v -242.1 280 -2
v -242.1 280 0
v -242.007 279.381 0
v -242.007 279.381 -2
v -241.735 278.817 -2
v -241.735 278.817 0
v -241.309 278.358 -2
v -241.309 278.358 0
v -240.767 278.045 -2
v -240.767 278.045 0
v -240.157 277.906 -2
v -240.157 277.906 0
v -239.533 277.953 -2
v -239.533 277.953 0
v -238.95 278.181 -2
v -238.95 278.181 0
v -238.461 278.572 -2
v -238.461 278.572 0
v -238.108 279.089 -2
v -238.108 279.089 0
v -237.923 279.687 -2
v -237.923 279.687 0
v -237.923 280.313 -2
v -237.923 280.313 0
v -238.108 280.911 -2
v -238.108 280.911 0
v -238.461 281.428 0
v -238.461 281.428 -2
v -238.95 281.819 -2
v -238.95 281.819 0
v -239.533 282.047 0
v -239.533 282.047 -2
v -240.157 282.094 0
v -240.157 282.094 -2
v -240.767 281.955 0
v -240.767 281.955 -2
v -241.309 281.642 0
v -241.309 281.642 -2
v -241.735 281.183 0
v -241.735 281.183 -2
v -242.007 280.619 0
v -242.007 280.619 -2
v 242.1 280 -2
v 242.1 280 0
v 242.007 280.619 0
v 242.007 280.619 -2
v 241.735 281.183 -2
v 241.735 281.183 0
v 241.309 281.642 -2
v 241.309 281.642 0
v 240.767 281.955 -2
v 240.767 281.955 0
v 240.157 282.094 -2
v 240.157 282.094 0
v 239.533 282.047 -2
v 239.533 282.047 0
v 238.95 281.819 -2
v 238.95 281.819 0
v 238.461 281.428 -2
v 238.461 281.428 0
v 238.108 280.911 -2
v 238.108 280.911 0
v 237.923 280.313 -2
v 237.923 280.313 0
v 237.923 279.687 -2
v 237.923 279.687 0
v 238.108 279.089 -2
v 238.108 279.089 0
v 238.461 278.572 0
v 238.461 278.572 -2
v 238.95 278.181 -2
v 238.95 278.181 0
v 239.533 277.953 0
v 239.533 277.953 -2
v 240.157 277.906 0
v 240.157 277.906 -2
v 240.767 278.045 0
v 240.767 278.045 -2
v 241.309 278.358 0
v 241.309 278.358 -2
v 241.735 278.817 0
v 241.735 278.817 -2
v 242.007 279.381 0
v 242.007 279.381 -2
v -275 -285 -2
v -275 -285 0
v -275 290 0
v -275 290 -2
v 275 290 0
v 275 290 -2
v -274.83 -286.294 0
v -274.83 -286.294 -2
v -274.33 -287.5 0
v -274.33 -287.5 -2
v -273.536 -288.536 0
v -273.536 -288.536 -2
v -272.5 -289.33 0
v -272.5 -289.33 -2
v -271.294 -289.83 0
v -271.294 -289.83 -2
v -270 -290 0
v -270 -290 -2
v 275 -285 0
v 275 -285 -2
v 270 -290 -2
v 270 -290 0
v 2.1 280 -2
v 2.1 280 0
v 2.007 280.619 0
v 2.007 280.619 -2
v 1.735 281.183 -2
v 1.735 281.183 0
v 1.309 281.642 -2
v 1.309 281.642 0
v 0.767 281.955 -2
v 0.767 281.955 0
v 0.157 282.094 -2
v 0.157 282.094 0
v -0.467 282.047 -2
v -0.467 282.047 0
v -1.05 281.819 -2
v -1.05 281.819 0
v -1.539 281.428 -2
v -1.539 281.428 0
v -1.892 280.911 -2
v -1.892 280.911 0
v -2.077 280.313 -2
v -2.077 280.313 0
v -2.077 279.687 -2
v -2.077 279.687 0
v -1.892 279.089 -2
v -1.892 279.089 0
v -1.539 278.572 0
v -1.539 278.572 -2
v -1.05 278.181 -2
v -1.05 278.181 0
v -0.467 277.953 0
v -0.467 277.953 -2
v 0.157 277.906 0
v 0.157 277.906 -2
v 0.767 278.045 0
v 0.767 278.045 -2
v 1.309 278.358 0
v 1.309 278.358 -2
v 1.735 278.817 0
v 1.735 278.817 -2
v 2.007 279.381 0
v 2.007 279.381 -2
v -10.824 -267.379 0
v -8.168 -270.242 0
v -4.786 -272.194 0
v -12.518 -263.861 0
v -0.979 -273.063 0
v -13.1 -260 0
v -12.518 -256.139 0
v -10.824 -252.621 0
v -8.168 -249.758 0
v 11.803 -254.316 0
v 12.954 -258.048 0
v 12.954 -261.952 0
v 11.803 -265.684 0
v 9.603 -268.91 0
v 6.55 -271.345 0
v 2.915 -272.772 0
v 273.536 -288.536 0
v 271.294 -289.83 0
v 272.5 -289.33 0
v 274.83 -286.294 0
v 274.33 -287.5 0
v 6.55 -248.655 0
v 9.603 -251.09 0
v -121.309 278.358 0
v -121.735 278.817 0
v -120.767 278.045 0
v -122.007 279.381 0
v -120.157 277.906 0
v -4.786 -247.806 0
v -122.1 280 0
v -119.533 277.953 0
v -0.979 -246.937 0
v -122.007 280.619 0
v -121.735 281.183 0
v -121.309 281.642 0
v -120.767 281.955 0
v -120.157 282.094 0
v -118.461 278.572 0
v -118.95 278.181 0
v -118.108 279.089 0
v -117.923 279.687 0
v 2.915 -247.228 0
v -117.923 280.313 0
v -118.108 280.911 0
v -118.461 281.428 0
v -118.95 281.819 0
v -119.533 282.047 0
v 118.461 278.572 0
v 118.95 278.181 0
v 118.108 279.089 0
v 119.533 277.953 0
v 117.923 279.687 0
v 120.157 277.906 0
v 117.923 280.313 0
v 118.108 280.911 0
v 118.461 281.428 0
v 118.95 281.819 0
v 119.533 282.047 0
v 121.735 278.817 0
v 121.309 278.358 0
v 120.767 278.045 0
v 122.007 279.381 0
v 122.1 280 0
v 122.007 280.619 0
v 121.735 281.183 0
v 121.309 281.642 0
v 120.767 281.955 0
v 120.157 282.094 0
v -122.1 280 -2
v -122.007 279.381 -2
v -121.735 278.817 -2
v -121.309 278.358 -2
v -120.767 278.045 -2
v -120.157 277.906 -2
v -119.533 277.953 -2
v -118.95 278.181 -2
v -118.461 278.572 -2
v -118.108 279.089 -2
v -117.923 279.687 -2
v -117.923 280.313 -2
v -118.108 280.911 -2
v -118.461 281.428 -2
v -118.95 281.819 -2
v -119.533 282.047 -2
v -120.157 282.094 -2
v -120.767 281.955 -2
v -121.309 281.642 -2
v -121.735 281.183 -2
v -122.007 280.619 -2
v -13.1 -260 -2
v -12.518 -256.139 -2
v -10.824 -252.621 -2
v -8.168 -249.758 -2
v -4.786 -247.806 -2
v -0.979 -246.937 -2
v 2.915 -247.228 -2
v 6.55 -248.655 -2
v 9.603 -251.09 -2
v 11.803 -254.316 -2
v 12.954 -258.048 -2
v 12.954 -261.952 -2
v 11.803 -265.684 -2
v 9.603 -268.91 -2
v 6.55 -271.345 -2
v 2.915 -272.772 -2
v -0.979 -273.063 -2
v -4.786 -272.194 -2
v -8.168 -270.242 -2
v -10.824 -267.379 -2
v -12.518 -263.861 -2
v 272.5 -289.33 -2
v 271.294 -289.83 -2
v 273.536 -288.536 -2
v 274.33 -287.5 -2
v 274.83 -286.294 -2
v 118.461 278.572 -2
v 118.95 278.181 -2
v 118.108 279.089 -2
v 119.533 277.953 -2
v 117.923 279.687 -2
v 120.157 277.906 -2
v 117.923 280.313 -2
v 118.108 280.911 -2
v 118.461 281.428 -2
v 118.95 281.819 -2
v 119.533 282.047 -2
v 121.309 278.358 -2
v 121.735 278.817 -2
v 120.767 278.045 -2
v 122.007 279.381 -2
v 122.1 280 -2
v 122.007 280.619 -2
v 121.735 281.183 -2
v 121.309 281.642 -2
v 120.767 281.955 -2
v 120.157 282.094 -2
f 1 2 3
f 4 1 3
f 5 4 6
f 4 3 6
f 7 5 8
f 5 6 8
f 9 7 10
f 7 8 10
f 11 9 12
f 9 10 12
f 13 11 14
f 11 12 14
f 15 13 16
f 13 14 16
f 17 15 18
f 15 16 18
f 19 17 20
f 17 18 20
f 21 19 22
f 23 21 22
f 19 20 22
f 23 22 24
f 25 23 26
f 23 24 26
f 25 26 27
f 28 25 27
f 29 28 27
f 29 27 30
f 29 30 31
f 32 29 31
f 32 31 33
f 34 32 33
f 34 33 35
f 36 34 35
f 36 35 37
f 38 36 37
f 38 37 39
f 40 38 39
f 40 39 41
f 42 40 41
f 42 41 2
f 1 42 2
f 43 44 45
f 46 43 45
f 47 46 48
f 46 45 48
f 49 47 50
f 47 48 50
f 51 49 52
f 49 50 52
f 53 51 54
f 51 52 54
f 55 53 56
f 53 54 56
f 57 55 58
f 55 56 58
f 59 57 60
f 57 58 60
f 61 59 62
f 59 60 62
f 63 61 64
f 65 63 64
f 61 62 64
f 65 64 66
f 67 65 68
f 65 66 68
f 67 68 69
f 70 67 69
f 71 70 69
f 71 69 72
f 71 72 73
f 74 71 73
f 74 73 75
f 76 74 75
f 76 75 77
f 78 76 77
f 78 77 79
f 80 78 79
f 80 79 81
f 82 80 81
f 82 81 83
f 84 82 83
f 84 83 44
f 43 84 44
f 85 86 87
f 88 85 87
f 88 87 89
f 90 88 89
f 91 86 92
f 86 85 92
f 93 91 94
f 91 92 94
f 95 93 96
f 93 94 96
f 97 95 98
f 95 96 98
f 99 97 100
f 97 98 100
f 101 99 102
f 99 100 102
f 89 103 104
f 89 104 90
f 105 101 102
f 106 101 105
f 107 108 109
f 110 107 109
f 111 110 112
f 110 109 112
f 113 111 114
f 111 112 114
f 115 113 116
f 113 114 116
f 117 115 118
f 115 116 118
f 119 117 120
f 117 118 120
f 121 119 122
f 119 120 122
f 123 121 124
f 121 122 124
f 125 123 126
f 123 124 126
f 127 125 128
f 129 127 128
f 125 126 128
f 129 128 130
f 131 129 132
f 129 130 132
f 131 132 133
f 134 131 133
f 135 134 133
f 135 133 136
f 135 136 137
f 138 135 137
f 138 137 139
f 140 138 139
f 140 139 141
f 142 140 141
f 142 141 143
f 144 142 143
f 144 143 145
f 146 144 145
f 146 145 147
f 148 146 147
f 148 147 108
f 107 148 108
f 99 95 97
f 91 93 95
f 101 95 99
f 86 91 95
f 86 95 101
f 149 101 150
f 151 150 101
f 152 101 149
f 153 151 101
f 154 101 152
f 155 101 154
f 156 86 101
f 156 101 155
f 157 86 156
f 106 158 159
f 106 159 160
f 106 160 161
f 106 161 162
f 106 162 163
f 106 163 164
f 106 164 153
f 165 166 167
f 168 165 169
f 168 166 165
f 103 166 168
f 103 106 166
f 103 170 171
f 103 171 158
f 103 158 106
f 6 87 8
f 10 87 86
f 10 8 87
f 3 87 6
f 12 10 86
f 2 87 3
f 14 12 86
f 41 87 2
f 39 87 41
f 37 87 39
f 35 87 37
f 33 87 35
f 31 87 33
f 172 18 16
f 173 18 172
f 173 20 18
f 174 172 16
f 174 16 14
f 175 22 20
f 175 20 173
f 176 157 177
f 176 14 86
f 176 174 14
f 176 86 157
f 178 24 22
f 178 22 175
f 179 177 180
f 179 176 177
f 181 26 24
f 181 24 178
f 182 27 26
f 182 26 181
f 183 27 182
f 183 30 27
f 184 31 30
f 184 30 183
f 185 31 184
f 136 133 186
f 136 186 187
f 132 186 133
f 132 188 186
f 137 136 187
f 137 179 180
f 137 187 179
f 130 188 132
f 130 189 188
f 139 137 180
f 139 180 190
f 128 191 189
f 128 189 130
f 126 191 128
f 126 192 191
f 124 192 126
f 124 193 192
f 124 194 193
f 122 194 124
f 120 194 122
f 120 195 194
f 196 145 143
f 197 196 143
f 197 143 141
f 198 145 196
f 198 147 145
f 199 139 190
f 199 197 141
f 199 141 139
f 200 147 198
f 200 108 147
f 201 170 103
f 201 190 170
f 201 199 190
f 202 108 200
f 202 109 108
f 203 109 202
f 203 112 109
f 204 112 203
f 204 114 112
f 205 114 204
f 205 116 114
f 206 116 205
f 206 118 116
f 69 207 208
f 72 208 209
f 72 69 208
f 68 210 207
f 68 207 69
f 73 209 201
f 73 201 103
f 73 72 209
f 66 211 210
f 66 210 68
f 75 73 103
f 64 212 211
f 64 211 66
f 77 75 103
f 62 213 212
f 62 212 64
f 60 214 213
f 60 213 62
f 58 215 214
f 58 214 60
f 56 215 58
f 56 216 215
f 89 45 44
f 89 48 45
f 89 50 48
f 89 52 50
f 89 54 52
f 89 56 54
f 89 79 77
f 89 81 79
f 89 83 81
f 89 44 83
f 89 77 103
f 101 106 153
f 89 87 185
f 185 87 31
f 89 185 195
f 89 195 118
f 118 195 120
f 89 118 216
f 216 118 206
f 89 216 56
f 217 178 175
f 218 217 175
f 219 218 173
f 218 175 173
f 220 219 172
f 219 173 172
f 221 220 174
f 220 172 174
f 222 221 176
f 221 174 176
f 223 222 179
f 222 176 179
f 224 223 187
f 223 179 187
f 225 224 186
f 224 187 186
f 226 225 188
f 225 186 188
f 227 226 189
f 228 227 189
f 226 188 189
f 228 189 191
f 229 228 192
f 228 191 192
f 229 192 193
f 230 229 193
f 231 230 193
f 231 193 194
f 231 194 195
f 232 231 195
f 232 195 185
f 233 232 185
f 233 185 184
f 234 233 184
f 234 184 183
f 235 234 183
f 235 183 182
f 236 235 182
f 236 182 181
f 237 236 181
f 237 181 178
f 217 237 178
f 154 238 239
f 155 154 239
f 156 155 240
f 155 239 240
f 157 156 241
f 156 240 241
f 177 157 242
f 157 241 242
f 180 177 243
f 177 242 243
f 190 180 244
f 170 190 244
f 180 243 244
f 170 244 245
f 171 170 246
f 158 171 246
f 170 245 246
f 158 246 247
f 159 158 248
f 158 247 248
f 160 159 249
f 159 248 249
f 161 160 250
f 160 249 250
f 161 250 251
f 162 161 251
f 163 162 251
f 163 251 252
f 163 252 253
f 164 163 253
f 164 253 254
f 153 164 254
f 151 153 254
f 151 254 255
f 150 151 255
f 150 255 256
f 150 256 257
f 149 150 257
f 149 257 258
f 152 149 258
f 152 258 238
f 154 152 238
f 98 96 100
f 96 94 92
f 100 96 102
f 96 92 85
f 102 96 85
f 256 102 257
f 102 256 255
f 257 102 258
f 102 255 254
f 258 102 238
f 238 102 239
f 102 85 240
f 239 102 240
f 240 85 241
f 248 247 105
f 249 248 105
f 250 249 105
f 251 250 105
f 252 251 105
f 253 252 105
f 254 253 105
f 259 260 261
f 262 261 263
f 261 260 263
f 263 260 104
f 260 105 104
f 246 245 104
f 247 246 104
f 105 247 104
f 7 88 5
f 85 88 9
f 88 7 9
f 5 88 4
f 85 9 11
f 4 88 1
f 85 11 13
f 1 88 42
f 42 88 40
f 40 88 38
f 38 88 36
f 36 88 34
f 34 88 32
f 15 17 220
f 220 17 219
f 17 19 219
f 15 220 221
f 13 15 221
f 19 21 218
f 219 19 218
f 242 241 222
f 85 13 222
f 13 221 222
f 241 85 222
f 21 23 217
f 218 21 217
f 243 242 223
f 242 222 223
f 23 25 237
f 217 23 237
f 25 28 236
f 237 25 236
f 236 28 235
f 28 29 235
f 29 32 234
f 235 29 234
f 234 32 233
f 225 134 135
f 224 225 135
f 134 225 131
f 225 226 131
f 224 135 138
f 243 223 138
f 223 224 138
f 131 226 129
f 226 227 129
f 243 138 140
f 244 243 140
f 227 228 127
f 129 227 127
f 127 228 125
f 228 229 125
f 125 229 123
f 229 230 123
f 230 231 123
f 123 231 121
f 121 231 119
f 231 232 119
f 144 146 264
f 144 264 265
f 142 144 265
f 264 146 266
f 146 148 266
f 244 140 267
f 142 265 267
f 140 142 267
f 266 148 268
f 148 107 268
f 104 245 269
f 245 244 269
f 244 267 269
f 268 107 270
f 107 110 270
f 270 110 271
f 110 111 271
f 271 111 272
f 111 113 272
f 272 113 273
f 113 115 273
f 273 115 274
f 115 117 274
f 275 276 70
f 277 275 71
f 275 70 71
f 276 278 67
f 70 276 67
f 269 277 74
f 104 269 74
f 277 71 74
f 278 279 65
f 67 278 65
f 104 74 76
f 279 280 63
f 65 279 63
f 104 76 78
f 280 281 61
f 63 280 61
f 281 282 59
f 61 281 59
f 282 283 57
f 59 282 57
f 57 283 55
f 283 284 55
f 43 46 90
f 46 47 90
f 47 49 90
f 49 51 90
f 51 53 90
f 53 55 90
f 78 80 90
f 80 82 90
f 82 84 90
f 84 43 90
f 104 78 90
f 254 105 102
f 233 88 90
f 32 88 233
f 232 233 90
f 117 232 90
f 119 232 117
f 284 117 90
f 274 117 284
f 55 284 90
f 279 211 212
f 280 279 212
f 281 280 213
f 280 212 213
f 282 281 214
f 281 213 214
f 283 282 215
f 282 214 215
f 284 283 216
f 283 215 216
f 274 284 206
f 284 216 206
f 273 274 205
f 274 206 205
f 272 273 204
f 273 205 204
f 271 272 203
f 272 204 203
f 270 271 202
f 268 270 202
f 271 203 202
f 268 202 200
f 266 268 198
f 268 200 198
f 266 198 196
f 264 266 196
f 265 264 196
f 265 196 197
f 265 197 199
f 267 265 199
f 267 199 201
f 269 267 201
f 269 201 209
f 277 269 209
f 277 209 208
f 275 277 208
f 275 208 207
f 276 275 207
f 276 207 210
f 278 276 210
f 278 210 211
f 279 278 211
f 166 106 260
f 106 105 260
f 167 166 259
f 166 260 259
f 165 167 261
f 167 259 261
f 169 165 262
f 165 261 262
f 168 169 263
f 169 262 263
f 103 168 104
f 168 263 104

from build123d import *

# Parameters (mm, degrees)
SZKIC1_W                   = 550
SZKIC1_H                   = 580
ODGI_CIE_BAZOWE1_DEPTH     = 2
ZAOKR_GLENIE1_R            = 5
WYTNIJ_WYCI_GNI_CIE2_REACH = 401.661
SZKIC3_R                   = 2.1
WYTNIJ_WYCI_GNI_CIE3_REACH = 401.661
SZKIC4_R                   = 13.1


# Sheet-metal steps are written as plain solids
with BuildPart() as part:
    # Szkic1 → Odgięcie bazowe1 (new body)
    with BuildSketch(Plane.XY):
        Rectangle(SZKIC1_W, SZKIC1_H)
    extrude(amount=-ODGI_CIE_BAZOWE1_DEPTH)

    # Zaokrąglenie1
    zaokr_glenie1_edges = [part.edges().sort_by_distance(p)[0] for p in [
        (275, -290, -1),
        (-275, -290, -1),
    ]]
    fillet(zaokr_glenie1_edges, radius=ZAOKR_GLENIE1_R)

    # Szkic3 → Wytnij-wyciągnięcie2 (cut, up to next)
    with BuildSketch(Plane.XY, mode=Mode.PRIVATE) as wytnij_wyci_gni_cie2_sk1:
        with Locations((0, 280)):
            Circle(SZKIC3_R)
    wytnij_wyci_gni_cie2_tool1 = extrude(wytnij_wyci_gni_cie2_sk1.sketch, amount=-WYTNIJ_WYCI_GNI_CIE2_REACH, mode=Mode.PRIVATE) & part.part
    # Szkic3 → Wytnij-wyciągnięcie2 (cut, up to next)
    with BuildSketch(Plane.XY, mode=Mode.PRIVATE) as wytnij_wyci_gni_cie2_sk2:
        with Locations((120, 280)):
            Circle(SZKIC3_R)
    wytnij_wyci_gni_cie2_tool2 = extrude(wytnij_wyci_gni_cie2_sk2.sketch, amount=-WYTNIJ_WYCI_GNI_CIE2_REACH, mode=Mode.PRIVATE) & part.part
    # Szkic3 → Wytnij-wyciągnięcie2 (cut, up to next)
    with BuildSketch(Plane.XY, mode=Mode.PRIVATE) as wytnij_wyci_gni_cie2_sk3:
        with Locations((240, 280)):
            Circle(SZKIC3_R)
    wytnij_wyci_gni_cie2_tool3 = extrude(wytnij_wyci_gni_cie2_sk3.sketch, amount=-WYTNIJ_WYCI_GNI_CIE2_REACH, mode=Mode.PRIVATE) & part.part
    # Szkic3 → Wytnij-wyciągnięcie2 (cut, up to next)
    with BuildSketch(Plane.XY, mode=Mode.PRIVATE) as wytnij_wyci_gni_cie2_sk4:
        with Locations(Location((-240, 280, 0), (0, 0, 180))):
            Circle(SZKIC3_R)
    wytnij_wyci_gni_cie2_tool4 = extrude(wytnij_wyci_gni_cie2_sk4.sketch, amount=-WYTNIJ_WYCI_GNI_CIE2_REACH, mode=Mode.PRIVATE) & part.part
    # Szkic3 → Wytnij-wyciągnięcie2 (cut, up to next)
    with BuildSketch(Plane.XY, mode=Mode.PRIVATE) as wytnij_wyci_gni_cie2_sk5:
        with Locations(Location((-120, 280, 0), (0, 0, 180))):
            Circle(SZKIC3_R)
    wytnij_wyci_gni_cie2_tool5 = extrude(wytnij_wyci_gni_cie2_sk5.sketch, amount=-WYTNIJ_WYCI_GNI_CIE2_REACH, mode=Mode.PRIVATE) & part.part
    add(wytnij_wyci_gni_cie2_tool1.solids().sort_by_distance((0, 280, 0))[0], mode=Mode.SUBTRACT)
    add(wytnij_wyci_gni_cie2_tool2.solids().sort_by_distance((120, 280, 0))[0], mode=Mode.SUBTRACT)
    add(wytnij_wyci_gni_cie2_tool3.solids().sort_by_distance((240, 280, 0))[0], mode=Mode.SUBTRACT)
    add(wytnij_wyci_gni_cie2_tool4.solids().sort_by_distance((-240, 280, 0))[0], mode=Mode.SUBTRACT)
    add(wytnij_wyci_gni_cie2_tool5.solids().sort_by_distance((-120, 280, 0))[0], mode=Mode.SUBTRACT)

    # Szkic4 → Wytnij-wyciągnięcie3 (cut, up to next)
    with BuildSketch(Plane(origin=(0, 0, -2), x_dir=(-1, 0, 0), z_dir=(0, 0, -1)), mode=Mode.PRIVATE) as wytnij_wyci_gni_cie3_sk1:
        with Locations((0, -260)):
            Circle(SZKIC4_R)
    wytnij_wyci_gni_cie3_tool1 = extrude(wytnij_wyci_gni_cie3_sk1.sketch, amount=-WYTNIJ_WYCI_GNI_CIE3_REACH, mode=Mode.PRIVATE) & part.part
    add(wytnij_wyci_gni_cie3_tool1.solids().sort_by_distance((0, -260, -2))[0], mode=Mode.SUBTRACT)


solid = part.part
